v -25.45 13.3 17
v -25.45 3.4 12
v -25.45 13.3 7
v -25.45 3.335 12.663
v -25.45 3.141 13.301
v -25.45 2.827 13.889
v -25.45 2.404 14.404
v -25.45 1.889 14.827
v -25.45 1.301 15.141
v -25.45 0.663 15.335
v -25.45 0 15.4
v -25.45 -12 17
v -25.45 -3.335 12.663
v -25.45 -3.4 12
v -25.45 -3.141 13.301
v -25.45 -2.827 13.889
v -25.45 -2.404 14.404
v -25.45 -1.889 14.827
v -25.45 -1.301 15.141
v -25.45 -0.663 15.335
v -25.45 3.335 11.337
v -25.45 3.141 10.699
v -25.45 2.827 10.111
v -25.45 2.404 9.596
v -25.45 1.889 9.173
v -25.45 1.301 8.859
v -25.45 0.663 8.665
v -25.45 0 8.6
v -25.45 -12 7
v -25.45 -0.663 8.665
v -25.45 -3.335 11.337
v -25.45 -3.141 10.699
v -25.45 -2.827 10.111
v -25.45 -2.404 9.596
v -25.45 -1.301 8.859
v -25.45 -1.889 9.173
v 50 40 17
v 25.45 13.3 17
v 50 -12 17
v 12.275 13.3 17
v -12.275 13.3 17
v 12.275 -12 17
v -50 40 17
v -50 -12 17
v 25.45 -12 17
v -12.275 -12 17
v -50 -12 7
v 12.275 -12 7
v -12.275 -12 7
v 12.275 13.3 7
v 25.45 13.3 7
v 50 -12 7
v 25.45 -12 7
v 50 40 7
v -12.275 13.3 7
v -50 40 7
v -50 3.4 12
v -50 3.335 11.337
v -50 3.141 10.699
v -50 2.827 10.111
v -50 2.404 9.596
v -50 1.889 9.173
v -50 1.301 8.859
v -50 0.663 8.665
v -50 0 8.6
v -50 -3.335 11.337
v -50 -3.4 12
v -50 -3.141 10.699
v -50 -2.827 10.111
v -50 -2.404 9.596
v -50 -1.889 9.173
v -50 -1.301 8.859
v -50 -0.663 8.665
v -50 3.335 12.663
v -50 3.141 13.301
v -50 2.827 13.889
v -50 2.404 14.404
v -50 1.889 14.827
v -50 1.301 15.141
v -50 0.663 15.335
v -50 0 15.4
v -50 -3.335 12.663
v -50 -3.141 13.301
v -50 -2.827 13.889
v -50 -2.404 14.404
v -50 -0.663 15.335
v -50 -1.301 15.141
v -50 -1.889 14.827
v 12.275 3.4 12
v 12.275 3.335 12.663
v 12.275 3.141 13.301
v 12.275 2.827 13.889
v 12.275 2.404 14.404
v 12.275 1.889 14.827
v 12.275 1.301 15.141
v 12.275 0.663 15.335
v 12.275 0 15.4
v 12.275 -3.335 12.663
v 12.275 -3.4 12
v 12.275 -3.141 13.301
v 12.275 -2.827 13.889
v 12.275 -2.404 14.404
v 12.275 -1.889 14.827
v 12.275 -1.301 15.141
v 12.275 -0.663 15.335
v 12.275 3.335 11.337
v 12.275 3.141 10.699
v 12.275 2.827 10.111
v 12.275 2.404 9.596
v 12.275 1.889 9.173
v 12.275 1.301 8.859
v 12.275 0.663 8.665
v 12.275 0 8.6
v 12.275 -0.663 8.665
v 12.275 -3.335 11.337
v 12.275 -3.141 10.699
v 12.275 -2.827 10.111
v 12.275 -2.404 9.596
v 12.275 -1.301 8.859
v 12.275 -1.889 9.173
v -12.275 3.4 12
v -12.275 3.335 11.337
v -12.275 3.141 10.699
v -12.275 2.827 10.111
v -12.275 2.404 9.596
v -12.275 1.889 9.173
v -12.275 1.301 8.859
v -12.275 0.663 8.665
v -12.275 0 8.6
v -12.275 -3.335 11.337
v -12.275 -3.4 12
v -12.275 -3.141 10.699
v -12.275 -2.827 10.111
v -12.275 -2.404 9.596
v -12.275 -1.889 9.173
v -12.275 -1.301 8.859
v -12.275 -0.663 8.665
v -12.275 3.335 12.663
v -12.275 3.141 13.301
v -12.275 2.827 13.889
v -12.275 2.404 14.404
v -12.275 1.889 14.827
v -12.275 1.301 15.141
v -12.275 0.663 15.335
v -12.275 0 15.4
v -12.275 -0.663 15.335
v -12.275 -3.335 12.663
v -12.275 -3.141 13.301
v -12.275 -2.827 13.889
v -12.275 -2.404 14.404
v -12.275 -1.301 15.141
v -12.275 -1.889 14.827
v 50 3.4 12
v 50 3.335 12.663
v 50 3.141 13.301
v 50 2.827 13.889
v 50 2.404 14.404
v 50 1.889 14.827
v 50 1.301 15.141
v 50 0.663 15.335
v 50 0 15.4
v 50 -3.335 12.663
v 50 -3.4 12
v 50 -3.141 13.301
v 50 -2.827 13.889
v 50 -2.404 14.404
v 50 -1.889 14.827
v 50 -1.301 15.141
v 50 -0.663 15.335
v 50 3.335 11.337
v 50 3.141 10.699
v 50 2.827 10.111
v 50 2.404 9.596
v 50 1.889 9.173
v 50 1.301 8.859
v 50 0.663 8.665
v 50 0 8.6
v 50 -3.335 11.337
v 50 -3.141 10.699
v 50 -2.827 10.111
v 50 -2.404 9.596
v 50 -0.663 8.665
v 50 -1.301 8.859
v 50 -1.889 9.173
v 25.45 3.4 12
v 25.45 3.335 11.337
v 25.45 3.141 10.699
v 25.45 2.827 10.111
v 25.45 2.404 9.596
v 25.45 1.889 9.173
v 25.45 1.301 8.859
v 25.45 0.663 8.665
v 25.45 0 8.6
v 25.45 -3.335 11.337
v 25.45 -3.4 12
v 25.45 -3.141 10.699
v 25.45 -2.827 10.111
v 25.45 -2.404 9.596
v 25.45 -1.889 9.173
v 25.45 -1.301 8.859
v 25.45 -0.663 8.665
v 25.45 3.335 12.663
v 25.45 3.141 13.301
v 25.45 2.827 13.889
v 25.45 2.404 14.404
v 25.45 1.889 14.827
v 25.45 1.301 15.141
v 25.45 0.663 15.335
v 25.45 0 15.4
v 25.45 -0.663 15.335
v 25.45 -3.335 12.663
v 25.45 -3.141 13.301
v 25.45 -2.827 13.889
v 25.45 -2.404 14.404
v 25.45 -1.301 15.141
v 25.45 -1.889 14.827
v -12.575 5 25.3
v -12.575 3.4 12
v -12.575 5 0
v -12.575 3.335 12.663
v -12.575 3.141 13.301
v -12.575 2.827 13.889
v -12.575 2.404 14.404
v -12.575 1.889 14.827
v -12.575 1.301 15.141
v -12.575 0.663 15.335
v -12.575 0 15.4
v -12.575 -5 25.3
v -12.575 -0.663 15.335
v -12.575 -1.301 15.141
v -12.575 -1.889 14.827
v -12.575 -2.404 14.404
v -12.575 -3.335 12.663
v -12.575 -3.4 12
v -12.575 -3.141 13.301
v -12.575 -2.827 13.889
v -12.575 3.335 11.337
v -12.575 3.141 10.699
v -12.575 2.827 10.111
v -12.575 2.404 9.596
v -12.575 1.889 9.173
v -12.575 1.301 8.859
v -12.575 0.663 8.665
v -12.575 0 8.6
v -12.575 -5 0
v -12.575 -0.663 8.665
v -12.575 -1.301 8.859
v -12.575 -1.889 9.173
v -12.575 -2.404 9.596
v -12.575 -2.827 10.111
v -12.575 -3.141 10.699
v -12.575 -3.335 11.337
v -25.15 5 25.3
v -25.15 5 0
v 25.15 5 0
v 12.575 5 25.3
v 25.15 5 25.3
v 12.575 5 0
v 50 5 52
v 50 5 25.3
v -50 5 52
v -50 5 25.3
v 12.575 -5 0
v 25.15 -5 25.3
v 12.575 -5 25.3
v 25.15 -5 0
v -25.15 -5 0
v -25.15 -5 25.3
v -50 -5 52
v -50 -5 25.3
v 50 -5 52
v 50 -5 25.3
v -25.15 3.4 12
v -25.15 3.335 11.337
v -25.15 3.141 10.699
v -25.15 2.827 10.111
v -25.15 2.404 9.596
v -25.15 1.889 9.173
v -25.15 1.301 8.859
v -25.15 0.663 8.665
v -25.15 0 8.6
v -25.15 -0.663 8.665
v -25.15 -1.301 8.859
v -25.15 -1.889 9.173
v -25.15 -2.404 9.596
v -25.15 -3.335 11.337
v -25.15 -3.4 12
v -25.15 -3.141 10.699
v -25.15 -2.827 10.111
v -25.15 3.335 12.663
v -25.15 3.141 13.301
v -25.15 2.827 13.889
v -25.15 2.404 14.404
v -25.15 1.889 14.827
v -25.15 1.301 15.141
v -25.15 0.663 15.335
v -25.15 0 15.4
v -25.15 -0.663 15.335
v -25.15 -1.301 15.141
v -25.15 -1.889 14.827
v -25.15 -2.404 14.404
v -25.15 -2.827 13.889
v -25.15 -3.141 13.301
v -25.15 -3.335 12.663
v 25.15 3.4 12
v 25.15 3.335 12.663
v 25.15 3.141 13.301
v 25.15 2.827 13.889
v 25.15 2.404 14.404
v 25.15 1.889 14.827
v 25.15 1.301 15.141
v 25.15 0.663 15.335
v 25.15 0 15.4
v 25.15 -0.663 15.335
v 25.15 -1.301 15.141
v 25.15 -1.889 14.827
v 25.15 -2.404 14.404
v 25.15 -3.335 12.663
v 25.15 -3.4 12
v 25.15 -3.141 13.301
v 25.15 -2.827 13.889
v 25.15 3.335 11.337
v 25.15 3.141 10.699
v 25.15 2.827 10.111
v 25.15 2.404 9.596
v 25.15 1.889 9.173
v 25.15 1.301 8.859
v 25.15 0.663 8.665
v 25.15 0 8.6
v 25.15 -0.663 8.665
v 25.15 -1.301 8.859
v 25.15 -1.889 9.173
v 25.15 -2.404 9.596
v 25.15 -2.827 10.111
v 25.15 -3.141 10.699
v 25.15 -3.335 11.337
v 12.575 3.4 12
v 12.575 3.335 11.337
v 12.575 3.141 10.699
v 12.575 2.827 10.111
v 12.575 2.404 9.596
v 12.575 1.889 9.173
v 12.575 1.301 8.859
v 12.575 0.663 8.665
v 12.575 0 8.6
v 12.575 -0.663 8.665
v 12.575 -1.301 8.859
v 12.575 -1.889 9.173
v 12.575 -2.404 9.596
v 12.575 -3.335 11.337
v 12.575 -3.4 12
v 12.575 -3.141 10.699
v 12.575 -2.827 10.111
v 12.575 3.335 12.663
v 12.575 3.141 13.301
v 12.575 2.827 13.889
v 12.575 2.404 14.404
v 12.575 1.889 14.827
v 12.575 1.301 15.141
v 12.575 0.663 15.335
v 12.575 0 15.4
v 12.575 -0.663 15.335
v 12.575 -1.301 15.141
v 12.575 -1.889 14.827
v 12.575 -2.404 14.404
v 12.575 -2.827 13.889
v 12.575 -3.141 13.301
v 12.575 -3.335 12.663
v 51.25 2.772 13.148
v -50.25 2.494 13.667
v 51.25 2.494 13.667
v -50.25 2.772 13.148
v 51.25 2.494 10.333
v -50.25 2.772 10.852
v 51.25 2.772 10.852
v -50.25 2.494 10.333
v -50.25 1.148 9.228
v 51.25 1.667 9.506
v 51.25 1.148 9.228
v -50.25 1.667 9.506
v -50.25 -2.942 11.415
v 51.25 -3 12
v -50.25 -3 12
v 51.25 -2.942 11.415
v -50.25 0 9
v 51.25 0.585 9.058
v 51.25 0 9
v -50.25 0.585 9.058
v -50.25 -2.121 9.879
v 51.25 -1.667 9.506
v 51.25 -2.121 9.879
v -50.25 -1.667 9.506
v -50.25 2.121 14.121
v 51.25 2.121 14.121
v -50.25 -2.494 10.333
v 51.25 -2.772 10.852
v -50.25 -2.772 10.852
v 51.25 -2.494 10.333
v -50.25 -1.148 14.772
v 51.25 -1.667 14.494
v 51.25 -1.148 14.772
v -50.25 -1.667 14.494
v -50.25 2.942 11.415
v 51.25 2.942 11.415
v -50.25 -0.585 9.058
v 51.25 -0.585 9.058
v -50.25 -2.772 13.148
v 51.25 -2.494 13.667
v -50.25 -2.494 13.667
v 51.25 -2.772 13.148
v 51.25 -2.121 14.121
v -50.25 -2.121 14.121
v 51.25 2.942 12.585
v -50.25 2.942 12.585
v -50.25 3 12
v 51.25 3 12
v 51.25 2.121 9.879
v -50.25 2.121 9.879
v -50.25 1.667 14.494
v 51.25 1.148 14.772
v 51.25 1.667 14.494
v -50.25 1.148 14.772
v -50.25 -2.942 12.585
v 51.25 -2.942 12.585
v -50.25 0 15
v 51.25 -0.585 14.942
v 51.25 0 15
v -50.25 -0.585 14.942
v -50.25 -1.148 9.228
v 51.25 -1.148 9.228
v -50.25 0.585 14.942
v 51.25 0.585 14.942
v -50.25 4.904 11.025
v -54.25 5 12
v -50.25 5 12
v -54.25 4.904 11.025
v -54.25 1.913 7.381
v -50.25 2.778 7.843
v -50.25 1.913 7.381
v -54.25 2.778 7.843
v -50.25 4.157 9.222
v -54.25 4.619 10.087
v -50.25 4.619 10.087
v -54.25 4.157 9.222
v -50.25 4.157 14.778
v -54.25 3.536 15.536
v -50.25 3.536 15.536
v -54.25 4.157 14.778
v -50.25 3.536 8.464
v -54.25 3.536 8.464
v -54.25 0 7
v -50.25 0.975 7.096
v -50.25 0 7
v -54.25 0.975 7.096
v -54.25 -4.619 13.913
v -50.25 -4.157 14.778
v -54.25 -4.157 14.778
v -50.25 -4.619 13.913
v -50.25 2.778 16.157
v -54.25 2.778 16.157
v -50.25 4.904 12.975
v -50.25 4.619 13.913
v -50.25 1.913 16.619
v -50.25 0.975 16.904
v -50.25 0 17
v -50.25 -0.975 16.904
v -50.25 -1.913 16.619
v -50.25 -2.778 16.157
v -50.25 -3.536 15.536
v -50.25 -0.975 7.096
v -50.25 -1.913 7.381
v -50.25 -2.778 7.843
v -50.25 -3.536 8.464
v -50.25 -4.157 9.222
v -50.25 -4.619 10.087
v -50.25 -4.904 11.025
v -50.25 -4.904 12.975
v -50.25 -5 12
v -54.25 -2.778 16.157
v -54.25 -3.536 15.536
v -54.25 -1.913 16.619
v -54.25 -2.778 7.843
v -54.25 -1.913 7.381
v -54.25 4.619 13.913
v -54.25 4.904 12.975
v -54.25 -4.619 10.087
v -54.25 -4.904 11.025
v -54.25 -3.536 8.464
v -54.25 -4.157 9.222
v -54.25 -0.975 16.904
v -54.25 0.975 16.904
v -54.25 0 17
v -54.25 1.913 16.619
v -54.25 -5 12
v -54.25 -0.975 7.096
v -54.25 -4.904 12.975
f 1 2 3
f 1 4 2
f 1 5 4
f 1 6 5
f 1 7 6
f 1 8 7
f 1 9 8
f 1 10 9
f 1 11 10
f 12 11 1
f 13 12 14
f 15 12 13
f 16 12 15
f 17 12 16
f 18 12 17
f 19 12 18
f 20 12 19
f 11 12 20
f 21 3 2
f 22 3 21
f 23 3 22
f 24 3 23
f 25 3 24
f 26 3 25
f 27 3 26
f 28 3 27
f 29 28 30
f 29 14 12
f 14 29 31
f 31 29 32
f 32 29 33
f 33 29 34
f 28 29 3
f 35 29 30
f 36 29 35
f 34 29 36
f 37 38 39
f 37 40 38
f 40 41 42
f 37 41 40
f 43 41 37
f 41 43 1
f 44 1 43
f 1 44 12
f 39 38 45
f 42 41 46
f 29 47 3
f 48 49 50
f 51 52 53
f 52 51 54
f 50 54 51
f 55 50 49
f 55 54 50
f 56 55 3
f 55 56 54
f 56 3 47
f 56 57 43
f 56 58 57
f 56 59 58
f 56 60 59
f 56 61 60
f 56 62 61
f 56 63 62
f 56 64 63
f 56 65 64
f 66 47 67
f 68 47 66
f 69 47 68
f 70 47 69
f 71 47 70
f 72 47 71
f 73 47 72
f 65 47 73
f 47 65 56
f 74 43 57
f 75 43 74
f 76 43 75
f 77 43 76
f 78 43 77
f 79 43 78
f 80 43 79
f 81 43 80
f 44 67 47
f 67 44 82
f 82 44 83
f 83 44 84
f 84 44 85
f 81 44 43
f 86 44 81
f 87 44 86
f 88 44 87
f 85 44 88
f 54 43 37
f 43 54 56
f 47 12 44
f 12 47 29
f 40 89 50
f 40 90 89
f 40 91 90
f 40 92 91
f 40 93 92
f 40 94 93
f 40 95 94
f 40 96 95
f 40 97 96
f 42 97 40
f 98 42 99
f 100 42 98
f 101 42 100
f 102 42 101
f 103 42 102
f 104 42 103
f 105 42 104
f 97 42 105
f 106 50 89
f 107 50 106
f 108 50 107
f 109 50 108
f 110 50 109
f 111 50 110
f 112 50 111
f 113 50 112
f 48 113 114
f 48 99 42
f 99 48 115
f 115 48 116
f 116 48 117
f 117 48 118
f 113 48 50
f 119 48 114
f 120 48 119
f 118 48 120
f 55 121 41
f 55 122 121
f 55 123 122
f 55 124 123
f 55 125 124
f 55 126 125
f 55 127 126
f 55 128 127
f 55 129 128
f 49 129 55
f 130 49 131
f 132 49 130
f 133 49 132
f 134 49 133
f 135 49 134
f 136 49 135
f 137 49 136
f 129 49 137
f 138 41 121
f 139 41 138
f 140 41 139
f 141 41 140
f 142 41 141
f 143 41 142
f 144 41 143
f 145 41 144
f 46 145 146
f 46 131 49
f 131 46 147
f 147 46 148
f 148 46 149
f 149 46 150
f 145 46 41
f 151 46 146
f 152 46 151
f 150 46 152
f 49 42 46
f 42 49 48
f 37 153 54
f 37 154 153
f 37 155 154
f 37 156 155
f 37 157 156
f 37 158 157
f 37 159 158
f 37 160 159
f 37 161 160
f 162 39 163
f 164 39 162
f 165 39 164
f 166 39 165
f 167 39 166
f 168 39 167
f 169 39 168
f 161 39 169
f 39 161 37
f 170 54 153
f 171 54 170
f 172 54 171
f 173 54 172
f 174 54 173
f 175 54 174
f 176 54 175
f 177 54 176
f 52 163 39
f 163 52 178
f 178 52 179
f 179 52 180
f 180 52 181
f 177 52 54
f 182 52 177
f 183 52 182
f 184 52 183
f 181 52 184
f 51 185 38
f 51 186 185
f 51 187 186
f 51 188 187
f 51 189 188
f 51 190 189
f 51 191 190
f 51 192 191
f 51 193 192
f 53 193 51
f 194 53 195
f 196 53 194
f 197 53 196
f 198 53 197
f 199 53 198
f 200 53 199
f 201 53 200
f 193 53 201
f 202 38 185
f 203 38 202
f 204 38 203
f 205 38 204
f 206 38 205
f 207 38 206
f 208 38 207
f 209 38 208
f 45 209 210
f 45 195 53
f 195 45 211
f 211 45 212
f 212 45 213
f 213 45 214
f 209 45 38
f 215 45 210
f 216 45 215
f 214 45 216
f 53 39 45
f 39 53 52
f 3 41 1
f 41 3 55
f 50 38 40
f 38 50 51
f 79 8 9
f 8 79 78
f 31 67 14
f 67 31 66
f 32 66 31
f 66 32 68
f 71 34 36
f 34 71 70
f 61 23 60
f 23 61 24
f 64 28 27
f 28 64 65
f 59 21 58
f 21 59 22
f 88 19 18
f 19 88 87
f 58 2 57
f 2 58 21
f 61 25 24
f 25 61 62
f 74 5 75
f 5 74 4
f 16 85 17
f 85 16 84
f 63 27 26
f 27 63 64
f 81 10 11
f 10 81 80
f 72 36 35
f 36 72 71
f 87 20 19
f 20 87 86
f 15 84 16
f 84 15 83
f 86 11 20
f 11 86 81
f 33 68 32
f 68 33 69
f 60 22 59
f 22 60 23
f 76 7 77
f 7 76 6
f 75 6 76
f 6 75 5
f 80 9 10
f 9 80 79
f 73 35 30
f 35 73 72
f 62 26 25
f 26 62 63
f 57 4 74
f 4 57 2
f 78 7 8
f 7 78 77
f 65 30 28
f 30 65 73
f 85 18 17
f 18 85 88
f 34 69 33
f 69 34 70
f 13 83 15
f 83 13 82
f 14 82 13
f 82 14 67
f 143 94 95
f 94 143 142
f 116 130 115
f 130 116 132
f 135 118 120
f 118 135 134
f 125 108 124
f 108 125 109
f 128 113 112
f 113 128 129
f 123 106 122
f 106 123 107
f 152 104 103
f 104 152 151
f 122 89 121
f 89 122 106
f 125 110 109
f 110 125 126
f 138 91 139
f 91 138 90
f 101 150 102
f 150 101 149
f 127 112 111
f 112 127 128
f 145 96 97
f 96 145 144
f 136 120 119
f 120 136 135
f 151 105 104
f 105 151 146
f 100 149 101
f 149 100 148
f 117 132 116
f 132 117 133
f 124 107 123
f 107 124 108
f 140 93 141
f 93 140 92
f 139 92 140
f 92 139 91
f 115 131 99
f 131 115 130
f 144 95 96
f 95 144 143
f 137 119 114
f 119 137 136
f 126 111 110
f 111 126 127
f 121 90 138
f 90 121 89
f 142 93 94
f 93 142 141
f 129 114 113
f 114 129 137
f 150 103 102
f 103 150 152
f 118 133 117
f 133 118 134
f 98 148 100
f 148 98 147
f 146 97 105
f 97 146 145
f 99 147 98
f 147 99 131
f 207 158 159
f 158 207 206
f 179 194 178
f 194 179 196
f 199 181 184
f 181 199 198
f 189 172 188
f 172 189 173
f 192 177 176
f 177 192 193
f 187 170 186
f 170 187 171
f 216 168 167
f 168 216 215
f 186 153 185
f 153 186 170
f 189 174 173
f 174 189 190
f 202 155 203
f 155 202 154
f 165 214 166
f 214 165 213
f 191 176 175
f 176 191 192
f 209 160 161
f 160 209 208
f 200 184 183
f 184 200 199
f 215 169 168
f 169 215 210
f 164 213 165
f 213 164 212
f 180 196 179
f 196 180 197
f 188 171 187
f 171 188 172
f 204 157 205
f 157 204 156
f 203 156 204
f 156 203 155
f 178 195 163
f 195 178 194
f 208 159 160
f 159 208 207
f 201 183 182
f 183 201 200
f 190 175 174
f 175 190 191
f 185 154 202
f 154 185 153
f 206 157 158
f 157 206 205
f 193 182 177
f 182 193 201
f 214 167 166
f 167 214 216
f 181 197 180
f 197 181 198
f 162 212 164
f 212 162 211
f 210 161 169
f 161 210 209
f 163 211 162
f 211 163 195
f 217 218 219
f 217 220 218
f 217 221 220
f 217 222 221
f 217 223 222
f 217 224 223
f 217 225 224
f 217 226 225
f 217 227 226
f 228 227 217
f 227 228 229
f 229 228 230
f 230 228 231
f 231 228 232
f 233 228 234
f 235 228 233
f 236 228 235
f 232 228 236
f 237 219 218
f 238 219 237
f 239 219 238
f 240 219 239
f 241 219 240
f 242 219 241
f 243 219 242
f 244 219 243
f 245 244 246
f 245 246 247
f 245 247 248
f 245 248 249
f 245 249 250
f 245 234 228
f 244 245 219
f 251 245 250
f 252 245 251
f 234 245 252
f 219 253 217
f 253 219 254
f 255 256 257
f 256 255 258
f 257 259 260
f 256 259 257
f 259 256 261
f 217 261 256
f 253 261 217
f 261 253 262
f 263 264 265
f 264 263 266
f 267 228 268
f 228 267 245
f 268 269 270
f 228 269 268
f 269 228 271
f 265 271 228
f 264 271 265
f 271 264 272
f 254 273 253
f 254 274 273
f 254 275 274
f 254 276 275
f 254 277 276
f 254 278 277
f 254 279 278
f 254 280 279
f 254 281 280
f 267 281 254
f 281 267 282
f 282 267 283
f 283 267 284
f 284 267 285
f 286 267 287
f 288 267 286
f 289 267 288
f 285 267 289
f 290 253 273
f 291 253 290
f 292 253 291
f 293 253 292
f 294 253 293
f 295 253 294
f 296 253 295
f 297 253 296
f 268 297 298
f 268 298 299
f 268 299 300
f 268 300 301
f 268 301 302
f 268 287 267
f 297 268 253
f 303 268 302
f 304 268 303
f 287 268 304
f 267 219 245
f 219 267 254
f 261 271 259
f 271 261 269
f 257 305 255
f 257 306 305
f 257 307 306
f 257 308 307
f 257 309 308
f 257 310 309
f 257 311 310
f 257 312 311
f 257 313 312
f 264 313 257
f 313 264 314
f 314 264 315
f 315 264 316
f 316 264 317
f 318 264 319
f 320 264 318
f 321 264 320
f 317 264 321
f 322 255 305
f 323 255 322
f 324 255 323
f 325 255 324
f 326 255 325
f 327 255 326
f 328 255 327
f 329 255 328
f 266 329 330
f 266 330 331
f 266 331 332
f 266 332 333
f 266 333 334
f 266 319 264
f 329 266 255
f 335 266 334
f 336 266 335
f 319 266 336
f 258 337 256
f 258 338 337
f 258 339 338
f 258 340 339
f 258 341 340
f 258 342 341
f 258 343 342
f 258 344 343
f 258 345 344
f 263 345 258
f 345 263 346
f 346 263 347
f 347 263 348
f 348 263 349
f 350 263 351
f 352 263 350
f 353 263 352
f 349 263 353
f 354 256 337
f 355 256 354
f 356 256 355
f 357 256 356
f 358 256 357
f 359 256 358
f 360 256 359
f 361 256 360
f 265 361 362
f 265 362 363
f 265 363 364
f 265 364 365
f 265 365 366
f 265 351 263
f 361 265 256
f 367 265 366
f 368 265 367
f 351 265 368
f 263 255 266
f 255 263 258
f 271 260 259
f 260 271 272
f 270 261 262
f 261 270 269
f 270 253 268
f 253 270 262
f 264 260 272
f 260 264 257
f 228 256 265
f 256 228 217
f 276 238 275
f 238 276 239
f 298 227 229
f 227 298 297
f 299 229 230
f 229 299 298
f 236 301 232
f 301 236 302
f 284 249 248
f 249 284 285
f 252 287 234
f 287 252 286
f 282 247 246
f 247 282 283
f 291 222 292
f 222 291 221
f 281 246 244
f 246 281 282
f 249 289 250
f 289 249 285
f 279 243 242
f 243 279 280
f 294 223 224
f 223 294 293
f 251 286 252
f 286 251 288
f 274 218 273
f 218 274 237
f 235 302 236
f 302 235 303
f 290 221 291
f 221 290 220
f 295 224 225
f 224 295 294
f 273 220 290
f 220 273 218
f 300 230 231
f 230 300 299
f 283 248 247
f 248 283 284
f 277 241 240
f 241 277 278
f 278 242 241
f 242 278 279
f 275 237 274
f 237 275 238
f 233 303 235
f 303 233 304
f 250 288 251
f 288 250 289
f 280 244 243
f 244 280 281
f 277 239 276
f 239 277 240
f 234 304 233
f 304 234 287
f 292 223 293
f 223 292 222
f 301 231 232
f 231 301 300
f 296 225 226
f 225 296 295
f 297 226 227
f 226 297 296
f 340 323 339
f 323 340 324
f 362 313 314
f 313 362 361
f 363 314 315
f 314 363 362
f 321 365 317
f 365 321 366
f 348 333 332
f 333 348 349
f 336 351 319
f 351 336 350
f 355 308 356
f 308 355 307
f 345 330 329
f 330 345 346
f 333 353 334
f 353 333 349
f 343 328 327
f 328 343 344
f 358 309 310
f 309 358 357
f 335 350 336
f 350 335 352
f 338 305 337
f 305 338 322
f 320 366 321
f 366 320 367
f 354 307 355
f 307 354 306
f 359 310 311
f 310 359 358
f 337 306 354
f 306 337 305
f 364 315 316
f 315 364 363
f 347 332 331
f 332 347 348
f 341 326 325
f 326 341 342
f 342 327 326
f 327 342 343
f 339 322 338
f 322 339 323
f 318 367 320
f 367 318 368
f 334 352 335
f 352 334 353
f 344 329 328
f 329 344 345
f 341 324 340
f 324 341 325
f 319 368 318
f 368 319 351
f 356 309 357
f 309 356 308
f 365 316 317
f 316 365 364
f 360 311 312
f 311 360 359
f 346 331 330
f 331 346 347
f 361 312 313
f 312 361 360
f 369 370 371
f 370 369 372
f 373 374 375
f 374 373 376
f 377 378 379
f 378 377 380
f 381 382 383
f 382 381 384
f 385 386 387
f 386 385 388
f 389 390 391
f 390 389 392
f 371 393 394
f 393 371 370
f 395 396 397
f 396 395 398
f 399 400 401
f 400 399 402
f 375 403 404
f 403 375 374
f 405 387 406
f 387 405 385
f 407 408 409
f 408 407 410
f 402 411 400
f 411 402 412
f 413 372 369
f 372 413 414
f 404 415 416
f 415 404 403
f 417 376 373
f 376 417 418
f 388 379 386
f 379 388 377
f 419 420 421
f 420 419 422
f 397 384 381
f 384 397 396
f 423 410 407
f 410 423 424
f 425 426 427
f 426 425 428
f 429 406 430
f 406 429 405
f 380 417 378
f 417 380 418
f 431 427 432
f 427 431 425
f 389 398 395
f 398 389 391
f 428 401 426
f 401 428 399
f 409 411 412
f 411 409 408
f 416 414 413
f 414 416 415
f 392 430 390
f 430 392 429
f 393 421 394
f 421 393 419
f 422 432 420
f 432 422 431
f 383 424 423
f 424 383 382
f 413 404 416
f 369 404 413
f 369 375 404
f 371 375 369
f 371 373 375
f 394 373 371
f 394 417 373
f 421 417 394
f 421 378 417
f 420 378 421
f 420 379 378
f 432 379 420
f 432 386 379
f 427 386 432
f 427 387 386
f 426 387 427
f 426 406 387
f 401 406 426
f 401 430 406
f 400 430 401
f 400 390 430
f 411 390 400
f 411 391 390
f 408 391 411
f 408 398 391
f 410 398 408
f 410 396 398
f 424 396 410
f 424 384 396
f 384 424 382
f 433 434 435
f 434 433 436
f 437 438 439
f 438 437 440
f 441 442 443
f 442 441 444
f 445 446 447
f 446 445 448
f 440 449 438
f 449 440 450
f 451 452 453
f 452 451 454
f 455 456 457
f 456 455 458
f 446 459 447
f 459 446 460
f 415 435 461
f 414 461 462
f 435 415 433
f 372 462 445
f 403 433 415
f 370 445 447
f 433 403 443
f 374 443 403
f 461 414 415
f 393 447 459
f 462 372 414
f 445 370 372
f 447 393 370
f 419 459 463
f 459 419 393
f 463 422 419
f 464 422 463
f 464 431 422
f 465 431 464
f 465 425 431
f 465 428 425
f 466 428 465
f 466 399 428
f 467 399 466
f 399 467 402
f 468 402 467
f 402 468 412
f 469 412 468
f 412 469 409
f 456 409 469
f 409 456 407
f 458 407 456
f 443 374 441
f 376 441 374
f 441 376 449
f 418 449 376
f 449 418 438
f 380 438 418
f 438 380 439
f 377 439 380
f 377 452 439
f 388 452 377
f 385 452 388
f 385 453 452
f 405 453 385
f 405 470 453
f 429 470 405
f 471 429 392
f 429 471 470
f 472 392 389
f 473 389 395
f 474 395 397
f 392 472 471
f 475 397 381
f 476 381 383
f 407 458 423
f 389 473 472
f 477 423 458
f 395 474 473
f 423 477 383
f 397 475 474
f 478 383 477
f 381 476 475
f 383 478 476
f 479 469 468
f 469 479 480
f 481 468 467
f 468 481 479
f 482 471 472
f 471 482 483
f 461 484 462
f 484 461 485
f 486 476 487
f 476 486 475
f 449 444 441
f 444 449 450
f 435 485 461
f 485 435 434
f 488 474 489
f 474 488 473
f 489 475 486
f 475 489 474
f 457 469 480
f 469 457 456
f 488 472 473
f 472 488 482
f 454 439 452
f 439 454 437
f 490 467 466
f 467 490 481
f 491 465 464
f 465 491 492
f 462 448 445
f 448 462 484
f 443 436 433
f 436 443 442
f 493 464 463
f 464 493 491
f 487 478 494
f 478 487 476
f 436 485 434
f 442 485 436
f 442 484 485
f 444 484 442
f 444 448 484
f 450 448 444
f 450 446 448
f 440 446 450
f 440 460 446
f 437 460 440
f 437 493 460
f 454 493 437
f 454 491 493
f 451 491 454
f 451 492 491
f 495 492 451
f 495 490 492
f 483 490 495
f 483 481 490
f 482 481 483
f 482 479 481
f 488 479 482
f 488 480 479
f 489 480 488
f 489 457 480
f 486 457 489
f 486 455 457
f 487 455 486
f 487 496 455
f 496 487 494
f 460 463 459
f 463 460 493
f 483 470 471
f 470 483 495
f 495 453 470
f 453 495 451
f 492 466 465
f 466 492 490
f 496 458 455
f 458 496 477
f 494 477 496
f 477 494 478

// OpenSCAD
$fn = 32;

// ------------------------------------------------------------------------
// Butt hinge: hinge 100 mm, leaf swung 270 deg
// Every part is its own module, assembly() places every instance.
// ------------------------------------------------------------------------

// --- part 1 ---
module hinge_base() {
  difference() {
    union() {
      translate([-50, -12, -5]) cube([24.55, 52, 10]);
      translate([-12.275, -12, -5]) cube([24.55, 52, 10]);
      translate([25.45, -12, -5]) cube([24.55, 52, 10]);
      translate([-50, 13.3, -5]) cube([100, 26.7, 10]);
    }
    translate([-37.725, 0, 0]) rotate([0, 90, 0]) cylinder(h = 26.55, d = 6.8, center = true);
    translate([0, 0, 0]) rotate([0, 90, 0]) cylinder(h = 26.55, d = 6.8, center = true);
    translate([37.725, 0, 0]) rotate([0, 90, 0]) cylinder(h = 26.55, d = 6.8, center = true);
  }
}

// --- part 2 ---
module hinge_mover() {
  difference() {
    union() {
      translate([-25.15, -40, -5]) cube([12.575, 52, 10]);
      translate([12.575, -40, -5]) cube([12.575, 52, 10]);
      translate([-50, -40, -5]) cube([100, 26.7, 10]);
    }
    translate([-18.863, 0, 0]) rotate([0, 90, 0]) cylinder(h = 14.575, d = 6.8, center = true);
    translate([18.863, 0, 0]) rotate([0, 90, 0]) cylinder(h = 14.575, d = 6.8, center = true);
  }
}

// --- part 3 ---
module hinge_pin() {
  rotate([0, 90, 0]) cylinder(h = 102.5, d = 6, center = true);
  translate([-54.25, 0, 0]) rotate([0, 90, 0]) cylinder(h = 4, d = 10);
}

// --- assembly ---
module assembly() {
  color([0.80, 0.24, 0.20]) translate([0, 0, 12]) rotate([0, 0, 0]) hinge_base();
  color([0.20, 0.45, 0.75]) translate([0, 0, 12]) rotate([270, 0, 0]) hinge_mover();
  color([0.25, 0.62, 0.32]) translate([0, 0, 12]) rotate([0, 0, 0]) hinge_pin();
}

assembly();
